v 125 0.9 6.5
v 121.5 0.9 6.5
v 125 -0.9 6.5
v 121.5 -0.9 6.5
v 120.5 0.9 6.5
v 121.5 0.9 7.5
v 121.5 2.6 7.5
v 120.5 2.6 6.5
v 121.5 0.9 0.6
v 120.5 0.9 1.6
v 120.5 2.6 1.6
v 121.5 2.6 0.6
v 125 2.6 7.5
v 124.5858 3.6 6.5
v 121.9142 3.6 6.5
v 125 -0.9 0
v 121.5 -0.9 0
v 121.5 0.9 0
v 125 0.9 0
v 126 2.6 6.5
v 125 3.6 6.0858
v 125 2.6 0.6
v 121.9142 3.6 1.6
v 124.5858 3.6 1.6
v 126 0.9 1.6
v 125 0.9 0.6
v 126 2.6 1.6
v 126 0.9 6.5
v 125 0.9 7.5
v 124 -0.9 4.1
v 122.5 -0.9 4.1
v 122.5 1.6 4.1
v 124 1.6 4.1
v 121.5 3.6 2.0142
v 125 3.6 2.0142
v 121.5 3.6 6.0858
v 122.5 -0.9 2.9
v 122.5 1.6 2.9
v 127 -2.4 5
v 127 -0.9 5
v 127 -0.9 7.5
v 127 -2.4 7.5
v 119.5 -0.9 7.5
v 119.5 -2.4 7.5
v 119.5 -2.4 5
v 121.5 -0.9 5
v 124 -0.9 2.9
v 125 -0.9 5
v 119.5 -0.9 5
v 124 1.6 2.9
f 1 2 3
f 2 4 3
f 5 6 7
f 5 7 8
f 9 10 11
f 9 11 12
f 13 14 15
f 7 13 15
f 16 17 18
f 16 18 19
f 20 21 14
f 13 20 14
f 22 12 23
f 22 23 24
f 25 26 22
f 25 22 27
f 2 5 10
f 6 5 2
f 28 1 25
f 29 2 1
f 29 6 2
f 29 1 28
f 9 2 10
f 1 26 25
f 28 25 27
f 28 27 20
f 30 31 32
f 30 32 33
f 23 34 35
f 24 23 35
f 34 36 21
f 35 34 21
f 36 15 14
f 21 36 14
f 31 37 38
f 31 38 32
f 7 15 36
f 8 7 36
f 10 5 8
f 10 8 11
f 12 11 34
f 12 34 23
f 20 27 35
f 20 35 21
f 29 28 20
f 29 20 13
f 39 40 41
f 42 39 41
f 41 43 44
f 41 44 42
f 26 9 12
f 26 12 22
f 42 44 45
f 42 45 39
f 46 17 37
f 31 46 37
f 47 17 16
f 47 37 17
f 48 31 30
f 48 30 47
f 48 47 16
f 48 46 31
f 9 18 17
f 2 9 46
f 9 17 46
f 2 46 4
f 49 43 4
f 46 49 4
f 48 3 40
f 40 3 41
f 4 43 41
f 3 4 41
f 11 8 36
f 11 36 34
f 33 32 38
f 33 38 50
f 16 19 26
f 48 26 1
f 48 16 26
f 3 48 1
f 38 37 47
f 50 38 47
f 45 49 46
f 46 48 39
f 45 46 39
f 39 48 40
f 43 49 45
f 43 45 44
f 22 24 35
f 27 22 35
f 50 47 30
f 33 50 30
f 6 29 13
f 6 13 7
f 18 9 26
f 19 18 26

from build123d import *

# Parameters (mm, degrees)
SKETCH029_W     = 3.5
SKETCH029_H     = 6.5
PAD023_DEPTH    = 0.9
SKETCH030_W     = 7.5
SKETCH030_H     = 2.5
PAD024_DEPTH    = 1.5
PAD025_DEPTH    = 2.7
SKETCH032_W     = 1.5
SKETCH032_H     = 1.2
POCKET002_DEPTH = 2.5
CHAMFER004_SIZE = 1


with BuildPart() as part:
    # Sketch029 → Pad023 (new body, symmetric)
    with BuildSketch(Plane.XZ):
        with Locations((0, 3.25)):
            Rectangle(SKETCH029_W, SKETCH029_H)
    extrude(amount=PAD023_DEPTH, both=True)

    # Sketch030 (on Face6 of Pad023) → Pad024 (join)
    with BuildSketch(Plane.XZ.offset(0.9)):
        with Locations((0, 6.25)):
            Rectangle(SKETCH030_W, SKETCH030_H)
    extrude(amount=PAD024_DEPTH)

    # Sketch033 (on DatumPlane) → Pad025 (join)
    with BuildSketch(Plane(origin=(0, 0.9, 0), x_dir=(-1, 0, 0), z_dir=(0, 1, 0))):
        Polygon((-1.75, 7.5), (1.75, 7.5), (2.75, 6.5), (2.75, 1.6), (1.75, 0.6), (-1.75, 0.6), (-2.75, 1.6), (-2.75, 6.5), align=None)
    extrude(amount=PAD025_DEPTH)

    # Sketch032 → Pocket002 (cut)
    with BuildSketch(Plane.XZ.offset(0.9)):
        with Locations((0, 3.5)):
            Rectangle(SKETCH032_W, SKETCH032_H)
    extrude(amount=-POCKET002_DEPTH, mode=Mode.SUBTRACT)

    # Chamfer004
    chamfer004_edges = [part.edges().sort_by_distance(p)[0] for p in [
        (2.75, 3.6, 4.05),
        (2.25, 3.6, 7),
        (0, 3.6, 7.5),
        (-2.25, 3.6, 7),
        (-2.75, 3.6, 4.05),
        (-2.25, 3.6, 1.1),
        (0, 3.6, 0.6),
        (2.25, 3.6, 1.1),
    ]]
    chamfer(chamfer004_edges, length=CHAMFER004_SIZE)


with BuildPart() as part_1:
    # Body013 placement: moved
    add(part.part.moved(Location((123.25, 0, 0))))


solid = part_1.part
